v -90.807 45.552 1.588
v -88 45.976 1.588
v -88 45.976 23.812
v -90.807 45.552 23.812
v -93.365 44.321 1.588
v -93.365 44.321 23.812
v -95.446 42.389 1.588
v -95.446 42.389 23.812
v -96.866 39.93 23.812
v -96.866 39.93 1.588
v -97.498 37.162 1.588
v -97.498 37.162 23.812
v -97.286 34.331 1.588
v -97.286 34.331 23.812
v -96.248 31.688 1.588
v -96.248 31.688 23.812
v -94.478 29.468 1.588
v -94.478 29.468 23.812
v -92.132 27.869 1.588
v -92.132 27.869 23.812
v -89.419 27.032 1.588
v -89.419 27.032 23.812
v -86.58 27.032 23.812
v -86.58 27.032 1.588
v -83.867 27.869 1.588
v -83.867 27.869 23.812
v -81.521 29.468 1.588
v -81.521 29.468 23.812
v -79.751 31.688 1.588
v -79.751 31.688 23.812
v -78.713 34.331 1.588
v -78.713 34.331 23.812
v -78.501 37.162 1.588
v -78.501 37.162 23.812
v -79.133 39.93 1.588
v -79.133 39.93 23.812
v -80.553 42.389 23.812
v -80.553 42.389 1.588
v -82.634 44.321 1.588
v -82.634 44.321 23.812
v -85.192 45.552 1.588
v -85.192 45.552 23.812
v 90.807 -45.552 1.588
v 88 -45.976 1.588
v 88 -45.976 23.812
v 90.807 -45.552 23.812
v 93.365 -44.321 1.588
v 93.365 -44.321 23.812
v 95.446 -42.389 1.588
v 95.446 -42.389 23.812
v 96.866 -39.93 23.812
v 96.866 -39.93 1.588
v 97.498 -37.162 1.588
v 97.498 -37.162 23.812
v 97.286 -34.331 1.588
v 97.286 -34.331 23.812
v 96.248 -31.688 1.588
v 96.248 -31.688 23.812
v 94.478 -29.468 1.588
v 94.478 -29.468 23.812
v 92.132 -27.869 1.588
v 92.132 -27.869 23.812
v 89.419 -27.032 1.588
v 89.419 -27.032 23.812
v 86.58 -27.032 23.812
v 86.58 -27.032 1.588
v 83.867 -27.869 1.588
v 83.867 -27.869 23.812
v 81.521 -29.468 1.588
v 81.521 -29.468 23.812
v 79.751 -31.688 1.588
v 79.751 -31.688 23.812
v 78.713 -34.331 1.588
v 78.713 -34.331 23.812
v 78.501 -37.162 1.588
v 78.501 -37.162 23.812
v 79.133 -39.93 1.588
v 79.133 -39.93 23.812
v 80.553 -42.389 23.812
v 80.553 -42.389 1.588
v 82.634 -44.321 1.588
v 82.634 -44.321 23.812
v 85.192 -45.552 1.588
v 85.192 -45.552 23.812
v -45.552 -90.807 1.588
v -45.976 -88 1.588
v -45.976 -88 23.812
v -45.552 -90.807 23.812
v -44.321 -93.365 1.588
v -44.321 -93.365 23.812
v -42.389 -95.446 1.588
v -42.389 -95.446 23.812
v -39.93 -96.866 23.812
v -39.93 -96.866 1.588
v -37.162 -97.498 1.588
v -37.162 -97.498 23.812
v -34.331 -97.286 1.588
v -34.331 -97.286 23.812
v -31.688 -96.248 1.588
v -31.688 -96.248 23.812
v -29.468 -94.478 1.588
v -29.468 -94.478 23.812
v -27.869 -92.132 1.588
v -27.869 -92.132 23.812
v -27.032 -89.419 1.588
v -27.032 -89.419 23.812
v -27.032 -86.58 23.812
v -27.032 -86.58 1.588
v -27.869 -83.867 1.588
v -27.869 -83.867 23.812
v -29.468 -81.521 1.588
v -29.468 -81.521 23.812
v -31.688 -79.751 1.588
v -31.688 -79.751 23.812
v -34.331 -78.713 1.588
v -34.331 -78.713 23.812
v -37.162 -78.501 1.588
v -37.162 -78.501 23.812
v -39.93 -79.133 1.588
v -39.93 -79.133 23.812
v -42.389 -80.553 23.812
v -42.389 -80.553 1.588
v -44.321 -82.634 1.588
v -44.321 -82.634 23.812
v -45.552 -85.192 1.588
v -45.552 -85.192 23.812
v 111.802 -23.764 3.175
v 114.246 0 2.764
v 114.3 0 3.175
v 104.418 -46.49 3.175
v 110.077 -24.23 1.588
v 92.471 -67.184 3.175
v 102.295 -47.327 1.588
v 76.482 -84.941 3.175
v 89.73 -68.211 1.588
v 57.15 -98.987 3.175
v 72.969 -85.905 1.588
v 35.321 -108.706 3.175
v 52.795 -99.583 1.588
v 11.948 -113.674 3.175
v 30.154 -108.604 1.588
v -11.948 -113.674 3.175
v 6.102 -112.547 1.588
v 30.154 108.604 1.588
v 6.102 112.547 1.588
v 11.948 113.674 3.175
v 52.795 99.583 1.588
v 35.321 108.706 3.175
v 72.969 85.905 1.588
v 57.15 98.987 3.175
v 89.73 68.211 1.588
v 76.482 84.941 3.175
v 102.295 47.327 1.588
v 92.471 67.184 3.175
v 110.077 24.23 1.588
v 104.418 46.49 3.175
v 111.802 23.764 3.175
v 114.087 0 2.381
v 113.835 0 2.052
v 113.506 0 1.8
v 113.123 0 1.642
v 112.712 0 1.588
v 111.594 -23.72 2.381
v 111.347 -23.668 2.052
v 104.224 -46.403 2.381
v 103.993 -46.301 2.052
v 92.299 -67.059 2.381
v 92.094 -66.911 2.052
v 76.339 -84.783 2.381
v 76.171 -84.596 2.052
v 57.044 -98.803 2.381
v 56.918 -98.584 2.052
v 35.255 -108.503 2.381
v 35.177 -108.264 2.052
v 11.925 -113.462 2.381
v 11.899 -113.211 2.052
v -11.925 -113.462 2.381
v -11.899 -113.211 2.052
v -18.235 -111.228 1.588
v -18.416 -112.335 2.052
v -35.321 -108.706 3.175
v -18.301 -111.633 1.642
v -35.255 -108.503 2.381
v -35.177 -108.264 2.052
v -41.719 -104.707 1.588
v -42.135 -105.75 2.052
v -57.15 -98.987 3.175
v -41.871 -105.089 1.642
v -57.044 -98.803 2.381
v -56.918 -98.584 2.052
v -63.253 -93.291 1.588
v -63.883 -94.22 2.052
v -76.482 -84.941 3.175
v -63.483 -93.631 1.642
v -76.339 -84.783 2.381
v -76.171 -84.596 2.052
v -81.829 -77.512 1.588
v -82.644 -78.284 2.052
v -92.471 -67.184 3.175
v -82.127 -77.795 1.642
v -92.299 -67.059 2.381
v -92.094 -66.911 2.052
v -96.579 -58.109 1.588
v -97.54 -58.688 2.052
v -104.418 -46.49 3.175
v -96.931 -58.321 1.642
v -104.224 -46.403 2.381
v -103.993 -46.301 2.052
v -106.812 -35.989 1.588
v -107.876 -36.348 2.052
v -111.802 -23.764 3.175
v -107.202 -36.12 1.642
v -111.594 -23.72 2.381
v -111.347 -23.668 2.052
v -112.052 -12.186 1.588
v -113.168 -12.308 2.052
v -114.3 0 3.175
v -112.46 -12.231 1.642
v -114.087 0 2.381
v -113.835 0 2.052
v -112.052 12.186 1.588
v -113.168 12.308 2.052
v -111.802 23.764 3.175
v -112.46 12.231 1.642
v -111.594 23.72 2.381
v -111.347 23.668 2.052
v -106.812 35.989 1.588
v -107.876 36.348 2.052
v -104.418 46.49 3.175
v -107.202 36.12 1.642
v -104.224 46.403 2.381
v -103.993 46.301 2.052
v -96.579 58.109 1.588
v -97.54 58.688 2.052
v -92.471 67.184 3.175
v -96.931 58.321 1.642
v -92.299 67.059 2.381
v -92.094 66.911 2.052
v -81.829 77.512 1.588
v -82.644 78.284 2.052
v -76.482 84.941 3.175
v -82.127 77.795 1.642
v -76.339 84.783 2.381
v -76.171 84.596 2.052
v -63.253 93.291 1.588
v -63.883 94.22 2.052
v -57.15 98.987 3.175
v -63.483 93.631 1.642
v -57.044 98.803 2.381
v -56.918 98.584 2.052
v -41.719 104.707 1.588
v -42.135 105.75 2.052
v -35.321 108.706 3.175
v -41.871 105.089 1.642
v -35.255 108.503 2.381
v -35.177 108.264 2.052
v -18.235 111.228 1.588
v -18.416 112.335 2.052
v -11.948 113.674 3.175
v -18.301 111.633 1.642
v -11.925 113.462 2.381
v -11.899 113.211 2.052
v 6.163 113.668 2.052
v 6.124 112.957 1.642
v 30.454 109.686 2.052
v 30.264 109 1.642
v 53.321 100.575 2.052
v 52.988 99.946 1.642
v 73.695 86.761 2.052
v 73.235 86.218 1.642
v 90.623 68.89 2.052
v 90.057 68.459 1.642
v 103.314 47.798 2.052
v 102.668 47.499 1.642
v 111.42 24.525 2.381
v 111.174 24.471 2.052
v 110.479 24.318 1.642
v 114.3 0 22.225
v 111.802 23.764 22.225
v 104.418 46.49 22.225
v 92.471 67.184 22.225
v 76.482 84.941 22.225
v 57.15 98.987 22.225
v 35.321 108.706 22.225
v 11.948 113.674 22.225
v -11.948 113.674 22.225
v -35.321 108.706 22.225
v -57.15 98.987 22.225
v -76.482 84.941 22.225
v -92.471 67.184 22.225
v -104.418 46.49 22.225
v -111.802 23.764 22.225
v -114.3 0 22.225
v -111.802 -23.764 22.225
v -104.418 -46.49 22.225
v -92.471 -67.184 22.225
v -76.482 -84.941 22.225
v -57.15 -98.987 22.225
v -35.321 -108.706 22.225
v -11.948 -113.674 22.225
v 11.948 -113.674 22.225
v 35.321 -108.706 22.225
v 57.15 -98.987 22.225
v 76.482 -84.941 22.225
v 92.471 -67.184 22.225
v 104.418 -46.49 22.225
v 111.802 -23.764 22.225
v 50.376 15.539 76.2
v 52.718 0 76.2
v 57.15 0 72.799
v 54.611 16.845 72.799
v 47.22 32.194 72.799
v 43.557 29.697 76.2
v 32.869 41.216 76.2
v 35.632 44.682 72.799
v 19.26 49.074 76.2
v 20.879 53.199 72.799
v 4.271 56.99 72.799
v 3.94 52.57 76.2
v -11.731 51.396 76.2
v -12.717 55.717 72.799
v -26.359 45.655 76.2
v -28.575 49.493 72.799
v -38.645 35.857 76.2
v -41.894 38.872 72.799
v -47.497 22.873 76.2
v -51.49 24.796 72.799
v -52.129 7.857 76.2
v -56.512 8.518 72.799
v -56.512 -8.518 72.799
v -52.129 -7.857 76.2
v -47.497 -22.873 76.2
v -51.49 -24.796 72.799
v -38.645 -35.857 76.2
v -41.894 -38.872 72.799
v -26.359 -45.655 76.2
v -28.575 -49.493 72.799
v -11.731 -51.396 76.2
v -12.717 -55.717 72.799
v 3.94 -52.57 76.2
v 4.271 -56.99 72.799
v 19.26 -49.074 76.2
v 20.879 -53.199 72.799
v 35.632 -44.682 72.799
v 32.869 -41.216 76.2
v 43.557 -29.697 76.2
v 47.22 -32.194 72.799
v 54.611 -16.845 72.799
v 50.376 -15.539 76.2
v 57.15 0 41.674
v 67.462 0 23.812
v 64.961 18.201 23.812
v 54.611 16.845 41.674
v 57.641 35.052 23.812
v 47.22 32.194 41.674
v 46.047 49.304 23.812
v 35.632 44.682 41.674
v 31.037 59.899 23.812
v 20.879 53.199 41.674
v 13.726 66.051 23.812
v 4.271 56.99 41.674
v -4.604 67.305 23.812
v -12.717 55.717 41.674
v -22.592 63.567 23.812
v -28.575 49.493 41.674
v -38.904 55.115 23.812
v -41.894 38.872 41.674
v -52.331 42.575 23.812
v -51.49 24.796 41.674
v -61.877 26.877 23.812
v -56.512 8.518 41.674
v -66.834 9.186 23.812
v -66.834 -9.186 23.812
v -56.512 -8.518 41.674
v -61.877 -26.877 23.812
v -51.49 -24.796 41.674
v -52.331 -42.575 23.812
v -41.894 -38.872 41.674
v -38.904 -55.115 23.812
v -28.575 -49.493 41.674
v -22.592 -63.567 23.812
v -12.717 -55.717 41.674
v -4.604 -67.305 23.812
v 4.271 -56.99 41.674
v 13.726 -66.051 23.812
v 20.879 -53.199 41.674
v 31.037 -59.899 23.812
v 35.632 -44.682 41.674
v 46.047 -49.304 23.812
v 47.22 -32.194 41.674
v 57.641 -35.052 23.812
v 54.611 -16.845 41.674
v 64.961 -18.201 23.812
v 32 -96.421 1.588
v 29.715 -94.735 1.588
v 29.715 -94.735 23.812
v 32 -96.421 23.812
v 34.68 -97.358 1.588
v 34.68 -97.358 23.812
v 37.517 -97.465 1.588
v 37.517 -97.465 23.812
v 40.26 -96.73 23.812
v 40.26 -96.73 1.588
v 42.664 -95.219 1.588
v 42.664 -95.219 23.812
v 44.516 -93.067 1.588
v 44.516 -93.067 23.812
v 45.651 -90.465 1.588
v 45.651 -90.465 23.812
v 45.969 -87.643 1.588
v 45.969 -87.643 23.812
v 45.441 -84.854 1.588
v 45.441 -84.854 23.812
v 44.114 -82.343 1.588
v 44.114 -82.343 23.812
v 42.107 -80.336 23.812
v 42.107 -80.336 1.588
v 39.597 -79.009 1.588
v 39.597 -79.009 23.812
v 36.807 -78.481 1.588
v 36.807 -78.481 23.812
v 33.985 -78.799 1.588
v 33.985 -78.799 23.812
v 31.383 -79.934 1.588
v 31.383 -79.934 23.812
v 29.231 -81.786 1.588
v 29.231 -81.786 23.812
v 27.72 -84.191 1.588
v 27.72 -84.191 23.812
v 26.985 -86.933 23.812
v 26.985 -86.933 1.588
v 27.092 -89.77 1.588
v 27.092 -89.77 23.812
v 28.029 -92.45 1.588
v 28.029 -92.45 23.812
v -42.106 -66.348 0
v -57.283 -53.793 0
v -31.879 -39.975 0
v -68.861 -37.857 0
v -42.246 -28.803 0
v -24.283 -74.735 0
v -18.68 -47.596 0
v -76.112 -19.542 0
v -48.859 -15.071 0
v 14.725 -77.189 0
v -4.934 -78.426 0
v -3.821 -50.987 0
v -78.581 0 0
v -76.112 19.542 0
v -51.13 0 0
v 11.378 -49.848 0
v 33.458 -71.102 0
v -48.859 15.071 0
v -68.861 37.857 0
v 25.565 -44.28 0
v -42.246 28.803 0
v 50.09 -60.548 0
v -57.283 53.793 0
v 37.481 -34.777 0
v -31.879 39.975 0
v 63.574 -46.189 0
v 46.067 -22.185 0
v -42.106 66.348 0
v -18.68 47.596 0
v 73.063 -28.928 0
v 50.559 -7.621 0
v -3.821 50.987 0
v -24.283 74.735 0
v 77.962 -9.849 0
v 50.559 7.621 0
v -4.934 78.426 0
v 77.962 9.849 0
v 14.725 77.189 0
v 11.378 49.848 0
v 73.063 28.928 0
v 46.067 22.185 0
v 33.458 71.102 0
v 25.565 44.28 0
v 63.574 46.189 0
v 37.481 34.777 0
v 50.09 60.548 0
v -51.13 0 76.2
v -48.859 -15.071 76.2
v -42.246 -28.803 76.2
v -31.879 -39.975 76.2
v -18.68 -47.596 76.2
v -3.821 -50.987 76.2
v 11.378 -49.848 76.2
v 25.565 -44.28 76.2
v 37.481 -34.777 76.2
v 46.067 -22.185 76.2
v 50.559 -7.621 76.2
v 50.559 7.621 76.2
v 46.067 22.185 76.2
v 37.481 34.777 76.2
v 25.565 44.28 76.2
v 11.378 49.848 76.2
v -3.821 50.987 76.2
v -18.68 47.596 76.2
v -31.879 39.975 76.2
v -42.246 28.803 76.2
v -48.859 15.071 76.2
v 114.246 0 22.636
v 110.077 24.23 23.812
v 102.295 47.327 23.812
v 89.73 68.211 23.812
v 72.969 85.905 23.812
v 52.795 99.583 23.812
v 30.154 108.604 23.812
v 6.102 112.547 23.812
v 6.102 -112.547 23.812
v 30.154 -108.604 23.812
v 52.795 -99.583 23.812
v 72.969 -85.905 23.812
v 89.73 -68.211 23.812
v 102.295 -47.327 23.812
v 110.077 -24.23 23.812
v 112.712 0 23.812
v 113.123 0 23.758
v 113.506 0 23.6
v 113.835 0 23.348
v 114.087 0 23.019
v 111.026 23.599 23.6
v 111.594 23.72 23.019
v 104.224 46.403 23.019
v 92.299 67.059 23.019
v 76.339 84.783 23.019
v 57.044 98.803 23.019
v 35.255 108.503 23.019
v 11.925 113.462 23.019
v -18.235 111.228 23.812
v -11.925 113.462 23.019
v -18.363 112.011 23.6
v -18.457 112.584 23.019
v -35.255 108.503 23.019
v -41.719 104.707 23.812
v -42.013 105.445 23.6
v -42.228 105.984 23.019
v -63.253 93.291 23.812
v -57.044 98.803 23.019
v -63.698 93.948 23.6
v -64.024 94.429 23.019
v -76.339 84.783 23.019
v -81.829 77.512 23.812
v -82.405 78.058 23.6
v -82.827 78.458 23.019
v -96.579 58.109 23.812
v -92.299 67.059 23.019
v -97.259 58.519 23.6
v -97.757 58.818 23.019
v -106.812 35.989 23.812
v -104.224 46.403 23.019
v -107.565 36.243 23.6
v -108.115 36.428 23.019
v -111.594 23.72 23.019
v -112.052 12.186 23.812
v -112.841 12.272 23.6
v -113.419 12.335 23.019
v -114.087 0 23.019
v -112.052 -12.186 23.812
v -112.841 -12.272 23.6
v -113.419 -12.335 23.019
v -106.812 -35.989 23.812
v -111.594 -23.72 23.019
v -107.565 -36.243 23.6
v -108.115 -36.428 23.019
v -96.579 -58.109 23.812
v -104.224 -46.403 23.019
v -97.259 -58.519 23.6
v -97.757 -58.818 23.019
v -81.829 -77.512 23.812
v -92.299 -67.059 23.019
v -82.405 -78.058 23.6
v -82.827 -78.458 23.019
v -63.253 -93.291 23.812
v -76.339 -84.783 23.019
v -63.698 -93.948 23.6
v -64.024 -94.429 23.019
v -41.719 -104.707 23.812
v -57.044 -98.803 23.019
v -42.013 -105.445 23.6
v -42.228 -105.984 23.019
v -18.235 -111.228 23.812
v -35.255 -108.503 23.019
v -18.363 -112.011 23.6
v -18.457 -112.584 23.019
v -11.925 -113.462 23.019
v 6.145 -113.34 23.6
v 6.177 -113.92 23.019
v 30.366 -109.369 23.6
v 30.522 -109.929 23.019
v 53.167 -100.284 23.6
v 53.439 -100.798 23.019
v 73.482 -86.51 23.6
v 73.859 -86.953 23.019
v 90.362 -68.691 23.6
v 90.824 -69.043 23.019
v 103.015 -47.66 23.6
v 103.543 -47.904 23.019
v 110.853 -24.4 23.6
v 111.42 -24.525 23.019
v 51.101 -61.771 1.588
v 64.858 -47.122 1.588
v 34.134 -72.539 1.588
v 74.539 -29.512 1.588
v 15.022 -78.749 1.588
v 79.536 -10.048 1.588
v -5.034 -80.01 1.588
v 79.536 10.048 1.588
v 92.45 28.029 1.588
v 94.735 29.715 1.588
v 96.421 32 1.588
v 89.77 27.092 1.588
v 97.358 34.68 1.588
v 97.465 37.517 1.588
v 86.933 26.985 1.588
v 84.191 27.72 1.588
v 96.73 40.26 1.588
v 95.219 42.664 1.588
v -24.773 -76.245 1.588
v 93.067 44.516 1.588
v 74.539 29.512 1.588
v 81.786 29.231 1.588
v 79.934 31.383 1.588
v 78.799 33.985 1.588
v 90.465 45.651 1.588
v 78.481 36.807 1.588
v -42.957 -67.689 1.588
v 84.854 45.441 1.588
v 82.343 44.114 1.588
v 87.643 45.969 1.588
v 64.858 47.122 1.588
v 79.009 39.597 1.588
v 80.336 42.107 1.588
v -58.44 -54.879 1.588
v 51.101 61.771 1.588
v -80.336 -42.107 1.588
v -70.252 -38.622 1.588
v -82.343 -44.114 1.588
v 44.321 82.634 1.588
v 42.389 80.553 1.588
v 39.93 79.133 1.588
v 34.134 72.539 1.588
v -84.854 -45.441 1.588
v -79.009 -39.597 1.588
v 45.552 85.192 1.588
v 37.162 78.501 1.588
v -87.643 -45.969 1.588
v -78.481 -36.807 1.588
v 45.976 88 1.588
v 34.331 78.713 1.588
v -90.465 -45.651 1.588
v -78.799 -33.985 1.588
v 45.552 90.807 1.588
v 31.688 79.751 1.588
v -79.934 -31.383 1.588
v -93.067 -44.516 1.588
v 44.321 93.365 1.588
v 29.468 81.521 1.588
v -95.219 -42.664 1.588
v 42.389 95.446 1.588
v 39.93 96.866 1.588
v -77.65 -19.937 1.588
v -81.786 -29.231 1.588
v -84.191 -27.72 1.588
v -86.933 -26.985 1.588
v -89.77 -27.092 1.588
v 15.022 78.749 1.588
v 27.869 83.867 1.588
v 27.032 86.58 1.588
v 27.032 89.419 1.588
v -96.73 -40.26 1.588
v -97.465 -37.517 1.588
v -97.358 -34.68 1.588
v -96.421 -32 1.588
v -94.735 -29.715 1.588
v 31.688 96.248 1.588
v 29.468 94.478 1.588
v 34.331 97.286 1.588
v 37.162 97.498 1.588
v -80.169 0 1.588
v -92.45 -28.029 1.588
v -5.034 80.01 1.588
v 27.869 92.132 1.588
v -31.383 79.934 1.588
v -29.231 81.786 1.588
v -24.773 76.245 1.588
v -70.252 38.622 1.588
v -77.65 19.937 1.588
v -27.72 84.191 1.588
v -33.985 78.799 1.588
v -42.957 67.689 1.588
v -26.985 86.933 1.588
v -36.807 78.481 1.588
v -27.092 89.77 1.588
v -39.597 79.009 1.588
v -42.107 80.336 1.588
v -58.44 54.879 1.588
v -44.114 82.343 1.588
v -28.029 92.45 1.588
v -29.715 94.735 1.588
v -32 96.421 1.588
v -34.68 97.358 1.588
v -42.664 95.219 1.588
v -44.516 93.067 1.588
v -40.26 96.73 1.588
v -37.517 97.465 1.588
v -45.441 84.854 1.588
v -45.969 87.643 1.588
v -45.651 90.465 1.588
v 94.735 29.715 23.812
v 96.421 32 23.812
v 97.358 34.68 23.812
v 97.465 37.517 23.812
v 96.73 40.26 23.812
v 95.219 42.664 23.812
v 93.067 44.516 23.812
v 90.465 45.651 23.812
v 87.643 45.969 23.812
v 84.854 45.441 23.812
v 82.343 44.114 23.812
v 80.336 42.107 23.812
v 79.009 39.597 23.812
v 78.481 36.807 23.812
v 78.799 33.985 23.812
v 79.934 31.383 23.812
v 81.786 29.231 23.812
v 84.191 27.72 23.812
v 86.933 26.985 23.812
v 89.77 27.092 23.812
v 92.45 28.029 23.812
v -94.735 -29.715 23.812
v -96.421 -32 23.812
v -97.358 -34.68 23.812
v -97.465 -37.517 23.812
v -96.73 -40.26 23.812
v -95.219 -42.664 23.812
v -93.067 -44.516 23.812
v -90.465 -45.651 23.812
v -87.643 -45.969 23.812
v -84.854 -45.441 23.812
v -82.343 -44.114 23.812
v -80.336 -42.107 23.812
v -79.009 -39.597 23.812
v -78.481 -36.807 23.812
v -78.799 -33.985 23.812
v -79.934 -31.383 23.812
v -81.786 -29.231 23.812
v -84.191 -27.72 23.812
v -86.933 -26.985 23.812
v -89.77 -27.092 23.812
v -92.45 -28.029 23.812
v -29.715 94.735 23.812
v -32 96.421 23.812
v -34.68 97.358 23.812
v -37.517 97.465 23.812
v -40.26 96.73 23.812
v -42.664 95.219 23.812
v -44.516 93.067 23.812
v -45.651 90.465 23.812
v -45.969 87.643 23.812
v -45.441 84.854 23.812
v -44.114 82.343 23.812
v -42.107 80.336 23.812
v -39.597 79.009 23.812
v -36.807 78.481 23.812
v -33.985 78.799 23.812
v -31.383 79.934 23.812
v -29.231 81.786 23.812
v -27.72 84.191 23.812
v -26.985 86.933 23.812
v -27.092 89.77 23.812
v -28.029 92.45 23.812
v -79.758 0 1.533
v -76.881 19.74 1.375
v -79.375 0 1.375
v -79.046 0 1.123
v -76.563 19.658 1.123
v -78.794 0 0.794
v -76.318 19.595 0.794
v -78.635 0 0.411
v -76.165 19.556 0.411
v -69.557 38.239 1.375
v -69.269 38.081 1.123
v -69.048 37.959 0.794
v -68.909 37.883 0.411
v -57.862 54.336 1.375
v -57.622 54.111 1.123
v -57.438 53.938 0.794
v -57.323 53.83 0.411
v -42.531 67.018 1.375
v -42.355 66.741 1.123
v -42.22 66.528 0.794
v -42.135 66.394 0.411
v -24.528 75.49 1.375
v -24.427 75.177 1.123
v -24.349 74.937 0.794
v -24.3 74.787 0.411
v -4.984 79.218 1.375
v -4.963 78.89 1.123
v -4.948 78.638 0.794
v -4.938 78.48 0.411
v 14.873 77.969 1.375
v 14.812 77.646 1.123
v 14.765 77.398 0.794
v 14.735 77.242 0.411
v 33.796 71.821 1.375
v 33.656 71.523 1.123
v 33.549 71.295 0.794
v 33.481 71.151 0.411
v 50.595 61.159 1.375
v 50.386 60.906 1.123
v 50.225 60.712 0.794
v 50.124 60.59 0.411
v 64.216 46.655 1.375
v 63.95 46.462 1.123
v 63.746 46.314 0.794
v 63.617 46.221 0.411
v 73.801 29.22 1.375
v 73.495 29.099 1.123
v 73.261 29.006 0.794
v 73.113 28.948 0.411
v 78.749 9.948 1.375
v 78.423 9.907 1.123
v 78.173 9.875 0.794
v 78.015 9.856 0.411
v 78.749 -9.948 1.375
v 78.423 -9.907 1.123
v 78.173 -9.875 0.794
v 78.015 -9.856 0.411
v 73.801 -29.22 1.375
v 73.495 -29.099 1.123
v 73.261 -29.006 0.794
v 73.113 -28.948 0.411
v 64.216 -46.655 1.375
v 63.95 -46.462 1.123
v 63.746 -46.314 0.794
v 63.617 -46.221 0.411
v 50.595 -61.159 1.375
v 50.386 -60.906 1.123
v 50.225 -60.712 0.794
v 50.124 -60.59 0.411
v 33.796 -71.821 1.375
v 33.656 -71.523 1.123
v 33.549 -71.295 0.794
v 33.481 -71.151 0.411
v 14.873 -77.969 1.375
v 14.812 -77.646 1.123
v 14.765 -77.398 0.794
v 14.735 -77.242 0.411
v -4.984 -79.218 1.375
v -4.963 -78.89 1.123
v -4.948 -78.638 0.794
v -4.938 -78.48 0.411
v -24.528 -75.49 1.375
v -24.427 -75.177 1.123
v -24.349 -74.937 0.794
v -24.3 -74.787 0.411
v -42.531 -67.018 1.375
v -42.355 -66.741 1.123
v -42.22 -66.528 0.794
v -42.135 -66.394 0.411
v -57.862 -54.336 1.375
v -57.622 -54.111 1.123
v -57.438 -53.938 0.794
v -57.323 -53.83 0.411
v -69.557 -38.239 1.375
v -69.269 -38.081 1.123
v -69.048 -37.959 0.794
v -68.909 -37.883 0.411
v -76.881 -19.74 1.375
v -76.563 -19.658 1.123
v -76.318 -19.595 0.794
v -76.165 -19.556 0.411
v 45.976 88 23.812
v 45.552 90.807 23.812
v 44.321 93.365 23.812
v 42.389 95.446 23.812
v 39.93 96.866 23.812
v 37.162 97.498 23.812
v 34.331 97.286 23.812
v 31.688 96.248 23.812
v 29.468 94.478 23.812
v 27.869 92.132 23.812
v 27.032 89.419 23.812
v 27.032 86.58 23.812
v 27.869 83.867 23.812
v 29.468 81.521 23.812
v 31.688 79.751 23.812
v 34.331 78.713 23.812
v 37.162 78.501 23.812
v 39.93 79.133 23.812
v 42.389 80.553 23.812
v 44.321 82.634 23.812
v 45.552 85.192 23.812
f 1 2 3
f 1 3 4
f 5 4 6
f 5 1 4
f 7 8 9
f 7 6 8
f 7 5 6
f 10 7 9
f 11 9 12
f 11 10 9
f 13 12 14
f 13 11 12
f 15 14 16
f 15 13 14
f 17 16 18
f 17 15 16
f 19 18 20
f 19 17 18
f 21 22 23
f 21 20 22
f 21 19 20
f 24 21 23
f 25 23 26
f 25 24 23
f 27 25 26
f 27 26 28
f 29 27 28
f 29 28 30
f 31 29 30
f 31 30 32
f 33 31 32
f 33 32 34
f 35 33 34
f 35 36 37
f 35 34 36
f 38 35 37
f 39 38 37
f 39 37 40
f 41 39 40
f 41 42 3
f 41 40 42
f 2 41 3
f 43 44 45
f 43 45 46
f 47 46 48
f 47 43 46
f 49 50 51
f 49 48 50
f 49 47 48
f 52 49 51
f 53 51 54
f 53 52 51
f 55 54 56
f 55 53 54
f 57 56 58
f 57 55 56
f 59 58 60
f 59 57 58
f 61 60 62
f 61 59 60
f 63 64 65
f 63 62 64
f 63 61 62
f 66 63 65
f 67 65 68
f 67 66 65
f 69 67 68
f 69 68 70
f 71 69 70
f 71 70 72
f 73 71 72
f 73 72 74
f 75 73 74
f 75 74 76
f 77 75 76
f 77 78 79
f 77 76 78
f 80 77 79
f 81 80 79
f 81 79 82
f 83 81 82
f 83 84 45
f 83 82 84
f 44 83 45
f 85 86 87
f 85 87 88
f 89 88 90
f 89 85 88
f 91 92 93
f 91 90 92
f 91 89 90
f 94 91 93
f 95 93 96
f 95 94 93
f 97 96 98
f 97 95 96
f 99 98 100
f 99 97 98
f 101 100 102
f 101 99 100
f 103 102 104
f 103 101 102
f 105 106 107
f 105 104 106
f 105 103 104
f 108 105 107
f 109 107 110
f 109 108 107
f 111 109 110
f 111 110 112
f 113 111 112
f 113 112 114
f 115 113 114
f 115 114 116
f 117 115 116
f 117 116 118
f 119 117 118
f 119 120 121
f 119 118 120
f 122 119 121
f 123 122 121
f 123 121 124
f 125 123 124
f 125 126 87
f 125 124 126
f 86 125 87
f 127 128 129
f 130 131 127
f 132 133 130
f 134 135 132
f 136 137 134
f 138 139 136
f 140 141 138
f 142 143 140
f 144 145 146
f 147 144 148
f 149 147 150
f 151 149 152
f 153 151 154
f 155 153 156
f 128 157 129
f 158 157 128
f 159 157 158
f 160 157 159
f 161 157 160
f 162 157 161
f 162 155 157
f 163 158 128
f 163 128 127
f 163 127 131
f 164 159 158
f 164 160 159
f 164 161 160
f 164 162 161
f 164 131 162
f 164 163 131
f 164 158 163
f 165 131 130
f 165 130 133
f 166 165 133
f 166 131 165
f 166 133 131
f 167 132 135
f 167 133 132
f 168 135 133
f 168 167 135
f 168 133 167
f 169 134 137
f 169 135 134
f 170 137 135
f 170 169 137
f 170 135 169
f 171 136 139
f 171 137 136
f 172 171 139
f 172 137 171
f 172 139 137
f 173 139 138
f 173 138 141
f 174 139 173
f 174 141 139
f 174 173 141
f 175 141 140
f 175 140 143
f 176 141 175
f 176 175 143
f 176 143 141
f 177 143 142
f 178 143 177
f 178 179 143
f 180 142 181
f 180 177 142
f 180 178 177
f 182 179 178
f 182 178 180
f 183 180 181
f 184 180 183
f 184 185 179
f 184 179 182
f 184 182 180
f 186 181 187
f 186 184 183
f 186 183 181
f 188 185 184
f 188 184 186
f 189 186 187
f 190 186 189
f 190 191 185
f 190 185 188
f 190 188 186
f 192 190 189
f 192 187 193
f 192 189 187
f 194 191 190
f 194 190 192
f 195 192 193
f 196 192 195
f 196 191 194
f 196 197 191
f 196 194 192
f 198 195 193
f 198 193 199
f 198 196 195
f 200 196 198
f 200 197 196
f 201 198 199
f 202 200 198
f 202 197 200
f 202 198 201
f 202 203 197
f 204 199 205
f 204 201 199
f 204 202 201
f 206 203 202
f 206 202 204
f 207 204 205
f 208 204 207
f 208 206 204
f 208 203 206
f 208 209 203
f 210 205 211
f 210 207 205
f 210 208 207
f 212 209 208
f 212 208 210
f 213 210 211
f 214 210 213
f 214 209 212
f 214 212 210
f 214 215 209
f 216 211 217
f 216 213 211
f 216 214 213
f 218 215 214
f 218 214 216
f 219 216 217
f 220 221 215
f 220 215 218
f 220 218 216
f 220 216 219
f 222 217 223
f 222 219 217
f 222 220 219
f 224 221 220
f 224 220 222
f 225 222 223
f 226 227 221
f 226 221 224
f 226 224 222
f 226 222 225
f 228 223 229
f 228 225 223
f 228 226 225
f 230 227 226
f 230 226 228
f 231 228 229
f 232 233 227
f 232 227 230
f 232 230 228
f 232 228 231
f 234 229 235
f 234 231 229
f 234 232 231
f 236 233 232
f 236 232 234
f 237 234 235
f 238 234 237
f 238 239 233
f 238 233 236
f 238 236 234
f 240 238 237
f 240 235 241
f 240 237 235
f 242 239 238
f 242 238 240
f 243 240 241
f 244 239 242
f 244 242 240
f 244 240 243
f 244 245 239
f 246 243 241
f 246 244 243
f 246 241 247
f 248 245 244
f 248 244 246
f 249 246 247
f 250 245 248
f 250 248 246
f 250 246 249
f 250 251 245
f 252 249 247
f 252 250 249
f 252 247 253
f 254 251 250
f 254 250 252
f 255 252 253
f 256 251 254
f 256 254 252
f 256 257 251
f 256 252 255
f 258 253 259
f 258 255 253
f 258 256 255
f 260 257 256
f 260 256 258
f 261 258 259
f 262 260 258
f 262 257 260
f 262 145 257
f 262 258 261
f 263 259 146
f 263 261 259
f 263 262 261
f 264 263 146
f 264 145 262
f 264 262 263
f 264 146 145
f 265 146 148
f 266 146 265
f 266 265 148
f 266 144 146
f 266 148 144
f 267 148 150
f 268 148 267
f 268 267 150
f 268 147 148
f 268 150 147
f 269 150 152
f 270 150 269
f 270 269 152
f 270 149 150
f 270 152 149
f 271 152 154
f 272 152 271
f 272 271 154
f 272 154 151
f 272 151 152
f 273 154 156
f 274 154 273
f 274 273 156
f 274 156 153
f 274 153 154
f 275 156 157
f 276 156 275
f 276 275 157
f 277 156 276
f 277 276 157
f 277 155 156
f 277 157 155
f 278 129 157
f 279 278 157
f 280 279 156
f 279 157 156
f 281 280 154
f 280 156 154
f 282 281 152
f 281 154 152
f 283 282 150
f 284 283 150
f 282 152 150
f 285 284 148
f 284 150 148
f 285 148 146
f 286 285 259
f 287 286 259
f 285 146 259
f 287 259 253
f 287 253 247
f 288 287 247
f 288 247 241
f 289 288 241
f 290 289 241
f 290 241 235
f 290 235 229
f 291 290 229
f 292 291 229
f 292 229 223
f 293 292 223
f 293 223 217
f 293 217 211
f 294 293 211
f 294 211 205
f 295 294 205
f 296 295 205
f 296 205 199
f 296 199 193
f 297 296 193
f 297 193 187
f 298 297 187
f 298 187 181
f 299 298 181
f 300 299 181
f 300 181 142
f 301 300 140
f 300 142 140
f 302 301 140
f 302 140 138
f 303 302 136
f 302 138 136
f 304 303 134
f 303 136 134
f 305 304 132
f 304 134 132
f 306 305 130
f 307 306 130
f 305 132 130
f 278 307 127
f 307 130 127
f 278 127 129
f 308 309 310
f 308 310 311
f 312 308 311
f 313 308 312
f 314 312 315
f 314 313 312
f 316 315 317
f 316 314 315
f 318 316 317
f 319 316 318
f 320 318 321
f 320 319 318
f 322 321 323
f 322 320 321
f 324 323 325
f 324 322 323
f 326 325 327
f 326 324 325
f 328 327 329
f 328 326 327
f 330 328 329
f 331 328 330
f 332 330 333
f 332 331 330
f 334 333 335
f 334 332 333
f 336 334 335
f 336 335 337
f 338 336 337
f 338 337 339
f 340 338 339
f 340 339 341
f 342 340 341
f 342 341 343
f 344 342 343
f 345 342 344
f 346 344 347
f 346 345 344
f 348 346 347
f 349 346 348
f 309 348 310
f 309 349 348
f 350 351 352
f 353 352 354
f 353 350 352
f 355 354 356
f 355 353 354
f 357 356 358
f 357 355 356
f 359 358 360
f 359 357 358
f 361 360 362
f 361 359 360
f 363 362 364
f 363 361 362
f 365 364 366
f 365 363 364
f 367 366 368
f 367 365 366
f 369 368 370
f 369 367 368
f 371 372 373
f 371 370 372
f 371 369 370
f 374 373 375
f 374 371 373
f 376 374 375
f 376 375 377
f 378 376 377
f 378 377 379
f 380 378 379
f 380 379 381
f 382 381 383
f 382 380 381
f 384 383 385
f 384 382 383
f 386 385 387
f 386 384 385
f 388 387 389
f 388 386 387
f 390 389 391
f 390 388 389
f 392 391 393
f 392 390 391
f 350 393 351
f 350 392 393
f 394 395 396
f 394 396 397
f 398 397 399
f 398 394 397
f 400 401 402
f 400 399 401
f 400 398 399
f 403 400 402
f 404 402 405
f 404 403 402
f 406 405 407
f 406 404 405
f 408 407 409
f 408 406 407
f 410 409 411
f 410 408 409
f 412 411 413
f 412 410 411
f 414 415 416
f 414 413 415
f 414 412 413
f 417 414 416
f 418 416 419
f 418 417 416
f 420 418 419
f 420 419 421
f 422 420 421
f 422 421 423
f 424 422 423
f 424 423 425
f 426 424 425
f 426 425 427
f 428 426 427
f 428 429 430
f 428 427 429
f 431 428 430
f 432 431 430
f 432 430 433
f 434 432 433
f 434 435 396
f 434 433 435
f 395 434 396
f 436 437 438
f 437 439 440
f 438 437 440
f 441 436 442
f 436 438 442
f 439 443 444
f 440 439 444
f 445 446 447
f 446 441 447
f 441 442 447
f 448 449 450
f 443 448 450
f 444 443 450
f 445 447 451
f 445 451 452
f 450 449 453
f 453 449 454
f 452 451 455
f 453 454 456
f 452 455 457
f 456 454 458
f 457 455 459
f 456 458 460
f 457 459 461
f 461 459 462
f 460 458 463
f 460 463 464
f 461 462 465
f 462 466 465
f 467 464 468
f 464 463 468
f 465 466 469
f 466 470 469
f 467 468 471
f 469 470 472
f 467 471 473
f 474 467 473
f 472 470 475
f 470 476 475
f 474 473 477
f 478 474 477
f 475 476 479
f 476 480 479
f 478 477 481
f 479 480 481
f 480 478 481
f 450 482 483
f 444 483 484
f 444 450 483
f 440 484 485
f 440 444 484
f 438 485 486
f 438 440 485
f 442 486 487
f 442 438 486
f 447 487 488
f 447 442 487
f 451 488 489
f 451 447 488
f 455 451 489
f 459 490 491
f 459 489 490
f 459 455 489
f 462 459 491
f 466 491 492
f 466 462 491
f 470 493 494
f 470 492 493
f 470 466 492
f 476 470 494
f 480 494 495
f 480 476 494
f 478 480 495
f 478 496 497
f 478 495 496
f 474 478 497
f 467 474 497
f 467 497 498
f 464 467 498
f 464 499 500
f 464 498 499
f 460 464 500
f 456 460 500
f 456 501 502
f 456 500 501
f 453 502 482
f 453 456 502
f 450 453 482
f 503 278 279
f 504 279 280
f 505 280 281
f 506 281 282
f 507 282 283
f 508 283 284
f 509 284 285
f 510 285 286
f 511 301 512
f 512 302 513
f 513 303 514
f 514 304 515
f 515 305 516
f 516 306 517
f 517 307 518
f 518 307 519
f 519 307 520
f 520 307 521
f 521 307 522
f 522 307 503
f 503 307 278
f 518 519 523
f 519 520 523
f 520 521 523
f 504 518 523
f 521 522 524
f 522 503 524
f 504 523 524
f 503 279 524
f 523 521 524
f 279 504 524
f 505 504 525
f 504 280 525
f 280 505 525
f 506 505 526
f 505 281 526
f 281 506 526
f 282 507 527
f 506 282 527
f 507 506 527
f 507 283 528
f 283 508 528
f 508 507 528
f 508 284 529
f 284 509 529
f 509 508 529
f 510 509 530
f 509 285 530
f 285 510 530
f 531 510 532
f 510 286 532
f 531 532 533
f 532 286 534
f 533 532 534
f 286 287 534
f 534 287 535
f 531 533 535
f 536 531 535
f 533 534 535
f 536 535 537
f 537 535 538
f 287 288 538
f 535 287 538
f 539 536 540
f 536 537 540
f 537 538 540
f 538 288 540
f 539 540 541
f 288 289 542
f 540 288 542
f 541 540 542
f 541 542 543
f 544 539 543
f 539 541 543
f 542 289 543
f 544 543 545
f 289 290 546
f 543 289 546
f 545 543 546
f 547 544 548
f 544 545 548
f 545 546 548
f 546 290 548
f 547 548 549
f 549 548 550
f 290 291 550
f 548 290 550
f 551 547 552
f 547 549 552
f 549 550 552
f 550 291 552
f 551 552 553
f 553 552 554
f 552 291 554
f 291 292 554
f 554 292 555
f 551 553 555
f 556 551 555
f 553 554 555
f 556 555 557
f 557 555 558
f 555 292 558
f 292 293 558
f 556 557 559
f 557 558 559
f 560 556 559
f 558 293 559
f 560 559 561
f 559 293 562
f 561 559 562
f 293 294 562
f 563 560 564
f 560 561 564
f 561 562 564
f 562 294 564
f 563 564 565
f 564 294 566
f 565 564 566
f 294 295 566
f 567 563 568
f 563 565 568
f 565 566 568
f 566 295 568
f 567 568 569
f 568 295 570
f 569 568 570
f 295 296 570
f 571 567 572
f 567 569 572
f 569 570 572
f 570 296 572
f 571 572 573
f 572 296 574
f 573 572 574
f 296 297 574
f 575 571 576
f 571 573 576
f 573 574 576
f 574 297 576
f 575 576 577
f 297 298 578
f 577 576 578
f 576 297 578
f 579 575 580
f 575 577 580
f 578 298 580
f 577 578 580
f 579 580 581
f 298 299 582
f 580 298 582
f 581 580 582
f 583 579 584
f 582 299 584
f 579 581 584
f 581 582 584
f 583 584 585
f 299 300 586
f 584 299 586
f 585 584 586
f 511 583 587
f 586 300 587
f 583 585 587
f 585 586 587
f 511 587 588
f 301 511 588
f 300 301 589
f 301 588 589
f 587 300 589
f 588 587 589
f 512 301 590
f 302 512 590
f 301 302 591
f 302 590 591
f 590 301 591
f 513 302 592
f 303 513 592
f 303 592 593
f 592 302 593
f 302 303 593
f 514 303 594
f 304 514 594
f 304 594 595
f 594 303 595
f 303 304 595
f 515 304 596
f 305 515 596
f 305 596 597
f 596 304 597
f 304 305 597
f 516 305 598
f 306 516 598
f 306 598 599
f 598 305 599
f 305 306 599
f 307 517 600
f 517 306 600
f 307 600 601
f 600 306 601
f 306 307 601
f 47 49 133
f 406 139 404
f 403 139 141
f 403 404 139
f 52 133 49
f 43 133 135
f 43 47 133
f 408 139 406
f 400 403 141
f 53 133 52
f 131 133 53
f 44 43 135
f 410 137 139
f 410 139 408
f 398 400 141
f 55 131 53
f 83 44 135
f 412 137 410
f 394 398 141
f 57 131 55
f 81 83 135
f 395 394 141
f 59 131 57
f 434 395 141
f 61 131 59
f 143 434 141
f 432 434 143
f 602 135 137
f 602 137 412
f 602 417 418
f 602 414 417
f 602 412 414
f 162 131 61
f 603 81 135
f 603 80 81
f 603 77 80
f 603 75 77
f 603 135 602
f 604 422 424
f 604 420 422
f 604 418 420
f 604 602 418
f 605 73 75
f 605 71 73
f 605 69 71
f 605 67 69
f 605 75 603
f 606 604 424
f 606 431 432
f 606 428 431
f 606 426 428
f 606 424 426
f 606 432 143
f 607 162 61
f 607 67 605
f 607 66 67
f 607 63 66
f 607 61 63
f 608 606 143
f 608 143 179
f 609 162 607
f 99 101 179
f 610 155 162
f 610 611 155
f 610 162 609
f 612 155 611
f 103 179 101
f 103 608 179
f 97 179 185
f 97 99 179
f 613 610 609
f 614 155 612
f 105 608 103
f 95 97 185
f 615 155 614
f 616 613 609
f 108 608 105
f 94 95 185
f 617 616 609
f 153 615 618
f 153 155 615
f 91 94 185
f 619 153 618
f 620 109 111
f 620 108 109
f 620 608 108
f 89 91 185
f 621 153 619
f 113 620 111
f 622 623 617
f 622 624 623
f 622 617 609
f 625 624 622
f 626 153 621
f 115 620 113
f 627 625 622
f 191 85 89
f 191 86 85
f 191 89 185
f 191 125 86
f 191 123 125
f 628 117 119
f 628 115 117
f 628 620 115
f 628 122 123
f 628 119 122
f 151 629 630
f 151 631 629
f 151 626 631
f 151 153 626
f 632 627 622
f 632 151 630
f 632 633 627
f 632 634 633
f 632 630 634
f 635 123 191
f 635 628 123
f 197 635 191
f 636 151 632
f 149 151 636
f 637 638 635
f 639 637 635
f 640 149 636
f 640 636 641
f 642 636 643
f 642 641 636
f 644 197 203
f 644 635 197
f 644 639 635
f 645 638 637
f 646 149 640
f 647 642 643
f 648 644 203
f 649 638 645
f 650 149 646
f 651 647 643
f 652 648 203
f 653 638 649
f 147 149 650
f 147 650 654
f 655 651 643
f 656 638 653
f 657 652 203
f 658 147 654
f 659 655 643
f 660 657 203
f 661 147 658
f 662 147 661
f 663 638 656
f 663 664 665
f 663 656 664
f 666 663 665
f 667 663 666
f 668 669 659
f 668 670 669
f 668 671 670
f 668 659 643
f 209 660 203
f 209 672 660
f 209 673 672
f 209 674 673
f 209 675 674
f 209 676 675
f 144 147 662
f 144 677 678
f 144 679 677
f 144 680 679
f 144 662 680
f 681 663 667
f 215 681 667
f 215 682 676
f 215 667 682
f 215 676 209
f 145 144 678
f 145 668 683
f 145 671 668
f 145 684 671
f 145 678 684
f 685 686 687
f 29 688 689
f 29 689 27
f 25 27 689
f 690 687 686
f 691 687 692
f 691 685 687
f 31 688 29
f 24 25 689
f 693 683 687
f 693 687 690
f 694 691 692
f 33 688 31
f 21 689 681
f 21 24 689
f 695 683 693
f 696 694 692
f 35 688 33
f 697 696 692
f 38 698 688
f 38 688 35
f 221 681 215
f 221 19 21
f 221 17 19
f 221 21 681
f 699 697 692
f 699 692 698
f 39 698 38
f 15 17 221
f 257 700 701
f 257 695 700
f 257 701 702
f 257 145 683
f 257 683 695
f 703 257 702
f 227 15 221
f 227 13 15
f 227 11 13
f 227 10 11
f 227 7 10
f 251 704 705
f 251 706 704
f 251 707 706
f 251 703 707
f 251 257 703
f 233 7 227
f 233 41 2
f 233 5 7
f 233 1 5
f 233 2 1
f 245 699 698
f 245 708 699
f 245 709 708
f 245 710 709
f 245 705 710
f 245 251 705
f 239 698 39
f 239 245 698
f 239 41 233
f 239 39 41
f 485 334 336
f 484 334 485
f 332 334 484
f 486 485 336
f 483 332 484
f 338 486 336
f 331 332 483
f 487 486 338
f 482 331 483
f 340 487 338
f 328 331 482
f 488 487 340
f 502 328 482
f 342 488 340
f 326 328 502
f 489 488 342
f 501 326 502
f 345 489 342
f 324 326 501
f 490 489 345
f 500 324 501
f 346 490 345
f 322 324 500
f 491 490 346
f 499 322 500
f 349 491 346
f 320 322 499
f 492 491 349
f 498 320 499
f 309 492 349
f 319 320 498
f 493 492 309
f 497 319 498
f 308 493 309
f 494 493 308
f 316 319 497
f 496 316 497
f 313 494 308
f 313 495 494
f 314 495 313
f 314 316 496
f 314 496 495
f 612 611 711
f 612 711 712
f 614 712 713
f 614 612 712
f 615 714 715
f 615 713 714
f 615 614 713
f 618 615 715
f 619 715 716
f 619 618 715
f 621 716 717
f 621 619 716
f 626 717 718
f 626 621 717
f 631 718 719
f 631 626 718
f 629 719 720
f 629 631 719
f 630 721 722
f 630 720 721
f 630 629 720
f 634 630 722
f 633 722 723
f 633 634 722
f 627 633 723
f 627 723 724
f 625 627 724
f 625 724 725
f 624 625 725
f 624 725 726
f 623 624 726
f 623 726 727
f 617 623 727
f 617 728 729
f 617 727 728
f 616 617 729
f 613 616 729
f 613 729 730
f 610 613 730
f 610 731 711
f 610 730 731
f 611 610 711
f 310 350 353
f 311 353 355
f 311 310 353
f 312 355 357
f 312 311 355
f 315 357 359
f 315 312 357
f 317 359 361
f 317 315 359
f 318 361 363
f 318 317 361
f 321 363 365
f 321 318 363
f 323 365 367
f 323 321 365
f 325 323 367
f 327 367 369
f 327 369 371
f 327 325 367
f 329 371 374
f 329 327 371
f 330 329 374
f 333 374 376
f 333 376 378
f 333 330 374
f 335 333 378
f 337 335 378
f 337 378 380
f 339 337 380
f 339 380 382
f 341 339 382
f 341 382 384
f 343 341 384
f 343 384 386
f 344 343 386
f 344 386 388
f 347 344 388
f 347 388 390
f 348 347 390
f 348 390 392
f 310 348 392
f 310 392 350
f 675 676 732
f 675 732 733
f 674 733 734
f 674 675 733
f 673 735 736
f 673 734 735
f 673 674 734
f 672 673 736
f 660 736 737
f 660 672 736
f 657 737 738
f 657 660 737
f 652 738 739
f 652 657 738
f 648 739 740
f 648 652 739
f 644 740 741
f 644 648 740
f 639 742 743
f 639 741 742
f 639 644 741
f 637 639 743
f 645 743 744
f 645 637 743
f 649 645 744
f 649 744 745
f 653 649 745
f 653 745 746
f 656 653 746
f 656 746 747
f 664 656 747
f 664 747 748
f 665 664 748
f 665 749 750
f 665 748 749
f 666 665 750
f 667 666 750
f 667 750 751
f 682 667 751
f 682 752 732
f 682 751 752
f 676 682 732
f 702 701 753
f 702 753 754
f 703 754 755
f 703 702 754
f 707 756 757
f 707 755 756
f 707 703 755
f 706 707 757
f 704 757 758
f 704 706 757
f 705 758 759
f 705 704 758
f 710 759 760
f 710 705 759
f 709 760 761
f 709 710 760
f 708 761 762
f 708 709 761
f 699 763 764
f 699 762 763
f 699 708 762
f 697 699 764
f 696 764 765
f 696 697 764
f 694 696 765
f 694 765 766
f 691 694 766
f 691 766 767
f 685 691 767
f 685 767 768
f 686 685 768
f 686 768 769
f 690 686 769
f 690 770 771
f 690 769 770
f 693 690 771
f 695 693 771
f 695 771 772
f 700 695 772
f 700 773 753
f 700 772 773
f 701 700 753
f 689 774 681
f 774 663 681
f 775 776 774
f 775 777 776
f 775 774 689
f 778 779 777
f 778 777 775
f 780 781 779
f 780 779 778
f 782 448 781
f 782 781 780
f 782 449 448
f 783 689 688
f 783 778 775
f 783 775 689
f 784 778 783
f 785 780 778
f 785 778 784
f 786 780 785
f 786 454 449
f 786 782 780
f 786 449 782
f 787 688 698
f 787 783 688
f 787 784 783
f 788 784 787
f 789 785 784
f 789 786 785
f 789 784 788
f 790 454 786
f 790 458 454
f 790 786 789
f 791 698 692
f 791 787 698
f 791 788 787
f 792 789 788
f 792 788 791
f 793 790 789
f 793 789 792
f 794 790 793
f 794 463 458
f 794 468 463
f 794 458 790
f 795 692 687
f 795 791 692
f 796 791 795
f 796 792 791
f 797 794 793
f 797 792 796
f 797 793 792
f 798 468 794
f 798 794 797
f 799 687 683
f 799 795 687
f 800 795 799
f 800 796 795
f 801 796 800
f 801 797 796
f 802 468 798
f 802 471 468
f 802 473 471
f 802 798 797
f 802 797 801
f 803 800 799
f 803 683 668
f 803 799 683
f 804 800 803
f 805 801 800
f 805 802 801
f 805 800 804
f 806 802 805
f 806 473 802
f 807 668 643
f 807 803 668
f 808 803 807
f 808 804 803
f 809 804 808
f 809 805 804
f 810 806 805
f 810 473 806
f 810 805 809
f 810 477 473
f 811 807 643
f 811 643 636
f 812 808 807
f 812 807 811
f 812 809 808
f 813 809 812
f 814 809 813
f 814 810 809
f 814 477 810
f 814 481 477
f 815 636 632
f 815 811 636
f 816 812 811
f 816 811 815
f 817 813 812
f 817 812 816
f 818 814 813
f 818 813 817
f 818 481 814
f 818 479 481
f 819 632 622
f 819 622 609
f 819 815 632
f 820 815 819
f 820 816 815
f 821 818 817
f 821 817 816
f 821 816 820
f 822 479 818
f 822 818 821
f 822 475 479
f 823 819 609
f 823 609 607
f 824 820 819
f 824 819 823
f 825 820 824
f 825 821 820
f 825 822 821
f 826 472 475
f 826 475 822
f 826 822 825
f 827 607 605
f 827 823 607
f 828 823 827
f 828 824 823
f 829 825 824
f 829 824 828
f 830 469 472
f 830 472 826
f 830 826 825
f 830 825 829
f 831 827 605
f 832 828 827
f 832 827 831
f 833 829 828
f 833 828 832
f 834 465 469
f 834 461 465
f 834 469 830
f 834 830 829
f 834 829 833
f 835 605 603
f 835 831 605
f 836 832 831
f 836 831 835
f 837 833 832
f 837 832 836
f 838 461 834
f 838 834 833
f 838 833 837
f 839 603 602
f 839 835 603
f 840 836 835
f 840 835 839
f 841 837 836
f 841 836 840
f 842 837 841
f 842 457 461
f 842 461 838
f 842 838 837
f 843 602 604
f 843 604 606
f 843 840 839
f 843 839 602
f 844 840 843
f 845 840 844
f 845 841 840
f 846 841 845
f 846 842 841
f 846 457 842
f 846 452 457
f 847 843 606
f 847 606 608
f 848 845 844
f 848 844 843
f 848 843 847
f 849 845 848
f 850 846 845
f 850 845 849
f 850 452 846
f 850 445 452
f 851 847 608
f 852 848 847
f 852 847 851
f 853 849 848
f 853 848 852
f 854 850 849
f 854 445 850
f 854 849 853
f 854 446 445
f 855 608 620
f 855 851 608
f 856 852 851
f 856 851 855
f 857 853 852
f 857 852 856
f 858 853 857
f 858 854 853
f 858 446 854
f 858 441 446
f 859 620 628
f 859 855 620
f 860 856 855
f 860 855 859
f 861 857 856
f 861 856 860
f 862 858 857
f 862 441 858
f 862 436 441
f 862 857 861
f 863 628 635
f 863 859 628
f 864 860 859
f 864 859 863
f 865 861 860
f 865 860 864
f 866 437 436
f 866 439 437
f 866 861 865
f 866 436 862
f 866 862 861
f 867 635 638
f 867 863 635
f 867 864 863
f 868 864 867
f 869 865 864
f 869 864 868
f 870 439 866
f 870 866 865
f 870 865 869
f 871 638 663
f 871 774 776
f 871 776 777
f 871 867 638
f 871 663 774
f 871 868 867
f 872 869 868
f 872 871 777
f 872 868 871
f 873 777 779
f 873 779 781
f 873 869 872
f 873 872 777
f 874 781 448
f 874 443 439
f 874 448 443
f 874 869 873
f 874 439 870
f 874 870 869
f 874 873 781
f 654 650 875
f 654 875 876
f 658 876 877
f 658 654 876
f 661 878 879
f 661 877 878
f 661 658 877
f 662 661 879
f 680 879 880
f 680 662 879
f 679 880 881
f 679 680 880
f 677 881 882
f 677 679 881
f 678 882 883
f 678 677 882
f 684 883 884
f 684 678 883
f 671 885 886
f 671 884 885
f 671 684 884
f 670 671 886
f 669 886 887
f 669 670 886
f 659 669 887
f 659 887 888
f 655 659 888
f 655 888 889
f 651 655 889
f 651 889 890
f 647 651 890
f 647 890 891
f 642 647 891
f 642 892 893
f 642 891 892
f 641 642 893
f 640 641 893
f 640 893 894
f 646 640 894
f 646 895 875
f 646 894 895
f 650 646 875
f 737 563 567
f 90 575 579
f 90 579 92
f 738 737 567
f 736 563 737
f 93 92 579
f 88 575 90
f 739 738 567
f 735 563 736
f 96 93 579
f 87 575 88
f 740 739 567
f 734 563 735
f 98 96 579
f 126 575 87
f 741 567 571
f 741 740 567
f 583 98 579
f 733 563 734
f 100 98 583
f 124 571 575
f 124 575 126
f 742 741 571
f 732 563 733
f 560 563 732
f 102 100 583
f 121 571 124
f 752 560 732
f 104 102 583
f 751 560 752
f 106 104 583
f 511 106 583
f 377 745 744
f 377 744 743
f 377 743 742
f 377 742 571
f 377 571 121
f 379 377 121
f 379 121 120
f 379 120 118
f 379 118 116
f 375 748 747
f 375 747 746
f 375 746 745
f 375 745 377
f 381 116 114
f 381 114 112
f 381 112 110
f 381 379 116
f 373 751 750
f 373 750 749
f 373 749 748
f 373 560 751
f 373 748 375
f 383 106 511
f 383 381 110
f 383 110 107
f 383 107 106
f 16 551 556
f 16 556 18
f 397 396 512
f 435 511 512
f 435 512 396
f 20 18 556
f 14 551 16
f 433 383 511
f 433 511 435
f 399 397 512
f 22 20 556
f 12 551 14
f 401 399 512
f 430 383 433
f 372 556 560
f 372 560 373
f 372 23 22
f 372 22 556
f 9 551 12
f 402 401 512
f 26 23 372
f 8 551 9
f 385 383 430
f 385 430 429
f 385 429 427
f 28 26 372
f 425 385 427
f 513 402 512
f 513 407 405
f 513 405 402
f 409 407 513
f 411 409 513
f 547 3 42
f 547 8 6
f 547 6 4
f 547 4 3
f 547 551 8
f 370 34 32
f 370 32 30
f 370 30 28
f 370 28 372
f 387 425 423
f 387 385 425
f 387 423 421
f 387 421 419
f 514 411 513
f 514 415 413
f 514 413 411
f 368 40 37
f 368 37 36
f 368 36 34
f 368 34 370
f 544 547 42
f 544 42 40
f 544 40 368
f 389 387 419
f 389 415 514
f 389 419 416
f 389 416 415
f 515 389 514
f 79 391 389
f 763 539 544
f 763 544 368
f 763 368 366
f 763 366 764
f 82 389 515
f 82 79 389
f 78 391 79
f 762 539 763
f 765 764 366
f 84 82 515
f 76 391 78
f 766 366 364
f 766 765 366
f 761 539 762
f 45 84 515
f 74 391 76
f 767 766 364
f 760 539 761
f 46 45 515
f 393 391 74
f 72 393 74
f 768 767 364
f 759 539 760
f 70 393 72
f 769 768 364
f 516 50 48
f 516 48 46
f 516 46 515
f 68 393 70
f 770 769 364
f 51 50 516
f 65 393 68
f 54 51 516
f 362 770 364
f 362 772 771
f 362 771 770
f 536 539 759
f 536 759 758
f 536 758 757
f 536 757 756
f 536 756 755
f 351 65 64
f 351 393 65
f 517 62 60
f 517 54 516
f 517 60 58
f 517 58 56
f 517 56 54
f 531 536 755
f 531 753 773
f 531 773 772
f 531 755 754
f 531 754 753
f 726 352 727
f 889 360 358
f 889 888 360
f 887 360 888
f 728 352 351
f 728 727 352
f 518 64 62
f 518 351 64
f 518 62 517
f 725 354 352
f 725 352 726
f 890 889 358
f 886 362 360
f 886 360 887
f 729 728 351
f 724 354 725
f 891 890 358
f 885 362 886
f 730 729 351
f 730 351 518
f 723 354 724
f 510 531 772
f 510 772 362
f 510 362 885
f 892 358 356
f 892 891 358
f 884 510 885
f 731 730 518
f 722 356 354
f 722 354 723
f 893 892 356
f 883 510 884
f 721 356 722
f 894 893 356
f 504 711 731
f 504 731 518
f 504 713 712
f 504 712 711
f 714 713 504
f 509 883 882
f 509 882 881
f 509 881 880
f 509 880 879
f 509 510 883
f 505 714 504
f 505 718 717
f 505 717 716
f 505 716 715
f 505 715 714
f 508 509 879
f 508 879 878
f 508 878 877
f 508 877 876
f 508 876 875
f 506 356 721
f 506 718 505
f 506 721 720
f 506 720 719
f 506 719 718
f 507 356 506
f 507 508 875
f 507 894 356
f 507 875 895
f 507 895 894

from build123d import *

# Parameters (mm, degrees)
SKETCH1_R                 = 114.3
BOSS_EXTRUDE1_DEPTH       = 23.8125
SKETCH2_R                 = 9.525
BOLTHOLE_DEPTH            = 164.389152505
BOLTHOLEPATTERN_COUNT     = 8
SKETCH5_OUTSIDE_W         = 295.434
SKETCH5_OUTSIDE_H         = 295.434
SKETCH5_OUTSIDE_R         = 78.58125
RAISED_FACE_DEPTH         = 1.5875
SKETCH8_R                 = 67.4624
WELD_NECK_120_DRAFT_DEPTH = 52.3875
WELD_NECK_120_DRAFT_TAPER = 30
WELD_NECK_END_REACH       = 180.705
SKETCH9_R                 = 57.15
WELD_NECK_CHAMFER1_SIZE   = 3.401023409
WELD_NECK_CHAMFER1_SIZE2  = 4.4323
SKETCH7_R                 = 51.1302
BORE_DEPTH                = 179.704840449
FILLET2_R                 = 1.5875
FILLET3_R                 = 1.5875


with BuildPart() as part:
    # Sketch1 → Boss-Extrude1 (new body)
    with BuildSketch(Plane.XY):
        Circle(SKETCH1_R)
    extrude(amount=BOSS_EXTRUDE1_DEPTH)

    # Sketch2 → BoltHole (cut, through all)
    with BuildSketch(Plane.XY):
        with Locations((36.450596933, 87.999525472)):
            Circle(SKETCH2_R)
    bolthole = extrude(amount=BOLTHOLE_DEPTH, mode=Mode.SUBTRACT)

    # BoltHolePattern: BoltHole ×8 about axis
    boltholepattern_axis = Axis((0, 0, 0), (0, 0, 1))
    for i in range(1, BOLTHOLEPATTERN_COUNT):
        add(bolthole.rotate(boltholepattern_axis, i * 360 / BOLTHOLEPATTERN_COUNT), mode=Mode.SUBTRACT)

    # Sketch5 outside → Raised Face (cut)
    with BuildSketch(Plane(origin=(0, 0, 0), x_dir=(-1, 0, 0), z_dir=(0, 0, -1))):
        Rectangle(SKETCH5_OUTSIDE_W, SKETCH5_OUTSIDE_H)
        Circle(SKETCH5_OUTSIDE_R, mode=Mode.SUBTRACT)
    extrude(amount=-RAISED_FACE_DEPTH, mode=Mode.SUBTRACT)

    # Sketch8 → Weld Neck 120 Draft (add)
    with BuildSketch(Plane.XY.offset(23.8125)):
        Circle(SKETCH8_R)
    extrude(amount=WELD_NECK_120_DRAFT_DEPTH, taper=WELD_NECK_120_DRAFT_TAPER)

    # Sketch9 → Weld Neck End (add, up to next)
    with BuildSketch(Plane.XY.offset(76.2), mode=Mode.PRIVATE) as weld_neck_end_sk1:
        Circle(SKETCH9_R)
    weld_neck_end_tool1 = extrude(weld_neck_end_sk1.sketch, amount=-WELD_NECK_END_REACH, mode=Mode.PRIVATE) - part.part
    add(weld_neck_end_tool1.solids().sort_by_distance((0, 0, 76.2))[0])

    # Weld Neck Chamfer1
    weld_neck_chamfer1_edges = [part.edges().sort_by_distance(p)[0] for p in [
        (-57.15, 0, 76.2),
    ]]
    weld_neck_chamfer1_side = [part.faces().sort_by_distance(p)[0] for p in [
        (-57.15, 0, 58.937050374),
    ]]
    chamfer(weld_neck_chamfer1_edges, length=WELD_NECK_CHAMFER1_SIZE, length2=WELD_NECK_CHAMFER1_SIZE2, reference=weld_neck_chamfer1_side[0])

    # Sketch7 → Bore (cut, through all)
    with BuildSketch(Plane.XY):
        with Locations(Location((0, 0, 0), (0, 0, 180))):
            Circle(SKETCH7_R)
    extrude(amount=BORE_DEPTH, mode=Mode.SUBTRACT)

    # Fillet2
    fillet2_edges = [part.edges().sort_by_distance(p)[0] for p in [
        (-114.3, 0, 23.8125),
        (-114.3, 0, 1.5875),
    ]]
    fillet(fillet2_edges, radius=FILLET2_R)

    # Fillet3
    fillet3_edges = [part.edges().sort_by_distance(p)[0] for p in [
        (78.58125, 0, 1.5875),
    ]]
    fillet(fillet3_edges, radius=FILLET3_R - 0.0001)  # a hair under: the kernel refuses the full size


solid = part.part
